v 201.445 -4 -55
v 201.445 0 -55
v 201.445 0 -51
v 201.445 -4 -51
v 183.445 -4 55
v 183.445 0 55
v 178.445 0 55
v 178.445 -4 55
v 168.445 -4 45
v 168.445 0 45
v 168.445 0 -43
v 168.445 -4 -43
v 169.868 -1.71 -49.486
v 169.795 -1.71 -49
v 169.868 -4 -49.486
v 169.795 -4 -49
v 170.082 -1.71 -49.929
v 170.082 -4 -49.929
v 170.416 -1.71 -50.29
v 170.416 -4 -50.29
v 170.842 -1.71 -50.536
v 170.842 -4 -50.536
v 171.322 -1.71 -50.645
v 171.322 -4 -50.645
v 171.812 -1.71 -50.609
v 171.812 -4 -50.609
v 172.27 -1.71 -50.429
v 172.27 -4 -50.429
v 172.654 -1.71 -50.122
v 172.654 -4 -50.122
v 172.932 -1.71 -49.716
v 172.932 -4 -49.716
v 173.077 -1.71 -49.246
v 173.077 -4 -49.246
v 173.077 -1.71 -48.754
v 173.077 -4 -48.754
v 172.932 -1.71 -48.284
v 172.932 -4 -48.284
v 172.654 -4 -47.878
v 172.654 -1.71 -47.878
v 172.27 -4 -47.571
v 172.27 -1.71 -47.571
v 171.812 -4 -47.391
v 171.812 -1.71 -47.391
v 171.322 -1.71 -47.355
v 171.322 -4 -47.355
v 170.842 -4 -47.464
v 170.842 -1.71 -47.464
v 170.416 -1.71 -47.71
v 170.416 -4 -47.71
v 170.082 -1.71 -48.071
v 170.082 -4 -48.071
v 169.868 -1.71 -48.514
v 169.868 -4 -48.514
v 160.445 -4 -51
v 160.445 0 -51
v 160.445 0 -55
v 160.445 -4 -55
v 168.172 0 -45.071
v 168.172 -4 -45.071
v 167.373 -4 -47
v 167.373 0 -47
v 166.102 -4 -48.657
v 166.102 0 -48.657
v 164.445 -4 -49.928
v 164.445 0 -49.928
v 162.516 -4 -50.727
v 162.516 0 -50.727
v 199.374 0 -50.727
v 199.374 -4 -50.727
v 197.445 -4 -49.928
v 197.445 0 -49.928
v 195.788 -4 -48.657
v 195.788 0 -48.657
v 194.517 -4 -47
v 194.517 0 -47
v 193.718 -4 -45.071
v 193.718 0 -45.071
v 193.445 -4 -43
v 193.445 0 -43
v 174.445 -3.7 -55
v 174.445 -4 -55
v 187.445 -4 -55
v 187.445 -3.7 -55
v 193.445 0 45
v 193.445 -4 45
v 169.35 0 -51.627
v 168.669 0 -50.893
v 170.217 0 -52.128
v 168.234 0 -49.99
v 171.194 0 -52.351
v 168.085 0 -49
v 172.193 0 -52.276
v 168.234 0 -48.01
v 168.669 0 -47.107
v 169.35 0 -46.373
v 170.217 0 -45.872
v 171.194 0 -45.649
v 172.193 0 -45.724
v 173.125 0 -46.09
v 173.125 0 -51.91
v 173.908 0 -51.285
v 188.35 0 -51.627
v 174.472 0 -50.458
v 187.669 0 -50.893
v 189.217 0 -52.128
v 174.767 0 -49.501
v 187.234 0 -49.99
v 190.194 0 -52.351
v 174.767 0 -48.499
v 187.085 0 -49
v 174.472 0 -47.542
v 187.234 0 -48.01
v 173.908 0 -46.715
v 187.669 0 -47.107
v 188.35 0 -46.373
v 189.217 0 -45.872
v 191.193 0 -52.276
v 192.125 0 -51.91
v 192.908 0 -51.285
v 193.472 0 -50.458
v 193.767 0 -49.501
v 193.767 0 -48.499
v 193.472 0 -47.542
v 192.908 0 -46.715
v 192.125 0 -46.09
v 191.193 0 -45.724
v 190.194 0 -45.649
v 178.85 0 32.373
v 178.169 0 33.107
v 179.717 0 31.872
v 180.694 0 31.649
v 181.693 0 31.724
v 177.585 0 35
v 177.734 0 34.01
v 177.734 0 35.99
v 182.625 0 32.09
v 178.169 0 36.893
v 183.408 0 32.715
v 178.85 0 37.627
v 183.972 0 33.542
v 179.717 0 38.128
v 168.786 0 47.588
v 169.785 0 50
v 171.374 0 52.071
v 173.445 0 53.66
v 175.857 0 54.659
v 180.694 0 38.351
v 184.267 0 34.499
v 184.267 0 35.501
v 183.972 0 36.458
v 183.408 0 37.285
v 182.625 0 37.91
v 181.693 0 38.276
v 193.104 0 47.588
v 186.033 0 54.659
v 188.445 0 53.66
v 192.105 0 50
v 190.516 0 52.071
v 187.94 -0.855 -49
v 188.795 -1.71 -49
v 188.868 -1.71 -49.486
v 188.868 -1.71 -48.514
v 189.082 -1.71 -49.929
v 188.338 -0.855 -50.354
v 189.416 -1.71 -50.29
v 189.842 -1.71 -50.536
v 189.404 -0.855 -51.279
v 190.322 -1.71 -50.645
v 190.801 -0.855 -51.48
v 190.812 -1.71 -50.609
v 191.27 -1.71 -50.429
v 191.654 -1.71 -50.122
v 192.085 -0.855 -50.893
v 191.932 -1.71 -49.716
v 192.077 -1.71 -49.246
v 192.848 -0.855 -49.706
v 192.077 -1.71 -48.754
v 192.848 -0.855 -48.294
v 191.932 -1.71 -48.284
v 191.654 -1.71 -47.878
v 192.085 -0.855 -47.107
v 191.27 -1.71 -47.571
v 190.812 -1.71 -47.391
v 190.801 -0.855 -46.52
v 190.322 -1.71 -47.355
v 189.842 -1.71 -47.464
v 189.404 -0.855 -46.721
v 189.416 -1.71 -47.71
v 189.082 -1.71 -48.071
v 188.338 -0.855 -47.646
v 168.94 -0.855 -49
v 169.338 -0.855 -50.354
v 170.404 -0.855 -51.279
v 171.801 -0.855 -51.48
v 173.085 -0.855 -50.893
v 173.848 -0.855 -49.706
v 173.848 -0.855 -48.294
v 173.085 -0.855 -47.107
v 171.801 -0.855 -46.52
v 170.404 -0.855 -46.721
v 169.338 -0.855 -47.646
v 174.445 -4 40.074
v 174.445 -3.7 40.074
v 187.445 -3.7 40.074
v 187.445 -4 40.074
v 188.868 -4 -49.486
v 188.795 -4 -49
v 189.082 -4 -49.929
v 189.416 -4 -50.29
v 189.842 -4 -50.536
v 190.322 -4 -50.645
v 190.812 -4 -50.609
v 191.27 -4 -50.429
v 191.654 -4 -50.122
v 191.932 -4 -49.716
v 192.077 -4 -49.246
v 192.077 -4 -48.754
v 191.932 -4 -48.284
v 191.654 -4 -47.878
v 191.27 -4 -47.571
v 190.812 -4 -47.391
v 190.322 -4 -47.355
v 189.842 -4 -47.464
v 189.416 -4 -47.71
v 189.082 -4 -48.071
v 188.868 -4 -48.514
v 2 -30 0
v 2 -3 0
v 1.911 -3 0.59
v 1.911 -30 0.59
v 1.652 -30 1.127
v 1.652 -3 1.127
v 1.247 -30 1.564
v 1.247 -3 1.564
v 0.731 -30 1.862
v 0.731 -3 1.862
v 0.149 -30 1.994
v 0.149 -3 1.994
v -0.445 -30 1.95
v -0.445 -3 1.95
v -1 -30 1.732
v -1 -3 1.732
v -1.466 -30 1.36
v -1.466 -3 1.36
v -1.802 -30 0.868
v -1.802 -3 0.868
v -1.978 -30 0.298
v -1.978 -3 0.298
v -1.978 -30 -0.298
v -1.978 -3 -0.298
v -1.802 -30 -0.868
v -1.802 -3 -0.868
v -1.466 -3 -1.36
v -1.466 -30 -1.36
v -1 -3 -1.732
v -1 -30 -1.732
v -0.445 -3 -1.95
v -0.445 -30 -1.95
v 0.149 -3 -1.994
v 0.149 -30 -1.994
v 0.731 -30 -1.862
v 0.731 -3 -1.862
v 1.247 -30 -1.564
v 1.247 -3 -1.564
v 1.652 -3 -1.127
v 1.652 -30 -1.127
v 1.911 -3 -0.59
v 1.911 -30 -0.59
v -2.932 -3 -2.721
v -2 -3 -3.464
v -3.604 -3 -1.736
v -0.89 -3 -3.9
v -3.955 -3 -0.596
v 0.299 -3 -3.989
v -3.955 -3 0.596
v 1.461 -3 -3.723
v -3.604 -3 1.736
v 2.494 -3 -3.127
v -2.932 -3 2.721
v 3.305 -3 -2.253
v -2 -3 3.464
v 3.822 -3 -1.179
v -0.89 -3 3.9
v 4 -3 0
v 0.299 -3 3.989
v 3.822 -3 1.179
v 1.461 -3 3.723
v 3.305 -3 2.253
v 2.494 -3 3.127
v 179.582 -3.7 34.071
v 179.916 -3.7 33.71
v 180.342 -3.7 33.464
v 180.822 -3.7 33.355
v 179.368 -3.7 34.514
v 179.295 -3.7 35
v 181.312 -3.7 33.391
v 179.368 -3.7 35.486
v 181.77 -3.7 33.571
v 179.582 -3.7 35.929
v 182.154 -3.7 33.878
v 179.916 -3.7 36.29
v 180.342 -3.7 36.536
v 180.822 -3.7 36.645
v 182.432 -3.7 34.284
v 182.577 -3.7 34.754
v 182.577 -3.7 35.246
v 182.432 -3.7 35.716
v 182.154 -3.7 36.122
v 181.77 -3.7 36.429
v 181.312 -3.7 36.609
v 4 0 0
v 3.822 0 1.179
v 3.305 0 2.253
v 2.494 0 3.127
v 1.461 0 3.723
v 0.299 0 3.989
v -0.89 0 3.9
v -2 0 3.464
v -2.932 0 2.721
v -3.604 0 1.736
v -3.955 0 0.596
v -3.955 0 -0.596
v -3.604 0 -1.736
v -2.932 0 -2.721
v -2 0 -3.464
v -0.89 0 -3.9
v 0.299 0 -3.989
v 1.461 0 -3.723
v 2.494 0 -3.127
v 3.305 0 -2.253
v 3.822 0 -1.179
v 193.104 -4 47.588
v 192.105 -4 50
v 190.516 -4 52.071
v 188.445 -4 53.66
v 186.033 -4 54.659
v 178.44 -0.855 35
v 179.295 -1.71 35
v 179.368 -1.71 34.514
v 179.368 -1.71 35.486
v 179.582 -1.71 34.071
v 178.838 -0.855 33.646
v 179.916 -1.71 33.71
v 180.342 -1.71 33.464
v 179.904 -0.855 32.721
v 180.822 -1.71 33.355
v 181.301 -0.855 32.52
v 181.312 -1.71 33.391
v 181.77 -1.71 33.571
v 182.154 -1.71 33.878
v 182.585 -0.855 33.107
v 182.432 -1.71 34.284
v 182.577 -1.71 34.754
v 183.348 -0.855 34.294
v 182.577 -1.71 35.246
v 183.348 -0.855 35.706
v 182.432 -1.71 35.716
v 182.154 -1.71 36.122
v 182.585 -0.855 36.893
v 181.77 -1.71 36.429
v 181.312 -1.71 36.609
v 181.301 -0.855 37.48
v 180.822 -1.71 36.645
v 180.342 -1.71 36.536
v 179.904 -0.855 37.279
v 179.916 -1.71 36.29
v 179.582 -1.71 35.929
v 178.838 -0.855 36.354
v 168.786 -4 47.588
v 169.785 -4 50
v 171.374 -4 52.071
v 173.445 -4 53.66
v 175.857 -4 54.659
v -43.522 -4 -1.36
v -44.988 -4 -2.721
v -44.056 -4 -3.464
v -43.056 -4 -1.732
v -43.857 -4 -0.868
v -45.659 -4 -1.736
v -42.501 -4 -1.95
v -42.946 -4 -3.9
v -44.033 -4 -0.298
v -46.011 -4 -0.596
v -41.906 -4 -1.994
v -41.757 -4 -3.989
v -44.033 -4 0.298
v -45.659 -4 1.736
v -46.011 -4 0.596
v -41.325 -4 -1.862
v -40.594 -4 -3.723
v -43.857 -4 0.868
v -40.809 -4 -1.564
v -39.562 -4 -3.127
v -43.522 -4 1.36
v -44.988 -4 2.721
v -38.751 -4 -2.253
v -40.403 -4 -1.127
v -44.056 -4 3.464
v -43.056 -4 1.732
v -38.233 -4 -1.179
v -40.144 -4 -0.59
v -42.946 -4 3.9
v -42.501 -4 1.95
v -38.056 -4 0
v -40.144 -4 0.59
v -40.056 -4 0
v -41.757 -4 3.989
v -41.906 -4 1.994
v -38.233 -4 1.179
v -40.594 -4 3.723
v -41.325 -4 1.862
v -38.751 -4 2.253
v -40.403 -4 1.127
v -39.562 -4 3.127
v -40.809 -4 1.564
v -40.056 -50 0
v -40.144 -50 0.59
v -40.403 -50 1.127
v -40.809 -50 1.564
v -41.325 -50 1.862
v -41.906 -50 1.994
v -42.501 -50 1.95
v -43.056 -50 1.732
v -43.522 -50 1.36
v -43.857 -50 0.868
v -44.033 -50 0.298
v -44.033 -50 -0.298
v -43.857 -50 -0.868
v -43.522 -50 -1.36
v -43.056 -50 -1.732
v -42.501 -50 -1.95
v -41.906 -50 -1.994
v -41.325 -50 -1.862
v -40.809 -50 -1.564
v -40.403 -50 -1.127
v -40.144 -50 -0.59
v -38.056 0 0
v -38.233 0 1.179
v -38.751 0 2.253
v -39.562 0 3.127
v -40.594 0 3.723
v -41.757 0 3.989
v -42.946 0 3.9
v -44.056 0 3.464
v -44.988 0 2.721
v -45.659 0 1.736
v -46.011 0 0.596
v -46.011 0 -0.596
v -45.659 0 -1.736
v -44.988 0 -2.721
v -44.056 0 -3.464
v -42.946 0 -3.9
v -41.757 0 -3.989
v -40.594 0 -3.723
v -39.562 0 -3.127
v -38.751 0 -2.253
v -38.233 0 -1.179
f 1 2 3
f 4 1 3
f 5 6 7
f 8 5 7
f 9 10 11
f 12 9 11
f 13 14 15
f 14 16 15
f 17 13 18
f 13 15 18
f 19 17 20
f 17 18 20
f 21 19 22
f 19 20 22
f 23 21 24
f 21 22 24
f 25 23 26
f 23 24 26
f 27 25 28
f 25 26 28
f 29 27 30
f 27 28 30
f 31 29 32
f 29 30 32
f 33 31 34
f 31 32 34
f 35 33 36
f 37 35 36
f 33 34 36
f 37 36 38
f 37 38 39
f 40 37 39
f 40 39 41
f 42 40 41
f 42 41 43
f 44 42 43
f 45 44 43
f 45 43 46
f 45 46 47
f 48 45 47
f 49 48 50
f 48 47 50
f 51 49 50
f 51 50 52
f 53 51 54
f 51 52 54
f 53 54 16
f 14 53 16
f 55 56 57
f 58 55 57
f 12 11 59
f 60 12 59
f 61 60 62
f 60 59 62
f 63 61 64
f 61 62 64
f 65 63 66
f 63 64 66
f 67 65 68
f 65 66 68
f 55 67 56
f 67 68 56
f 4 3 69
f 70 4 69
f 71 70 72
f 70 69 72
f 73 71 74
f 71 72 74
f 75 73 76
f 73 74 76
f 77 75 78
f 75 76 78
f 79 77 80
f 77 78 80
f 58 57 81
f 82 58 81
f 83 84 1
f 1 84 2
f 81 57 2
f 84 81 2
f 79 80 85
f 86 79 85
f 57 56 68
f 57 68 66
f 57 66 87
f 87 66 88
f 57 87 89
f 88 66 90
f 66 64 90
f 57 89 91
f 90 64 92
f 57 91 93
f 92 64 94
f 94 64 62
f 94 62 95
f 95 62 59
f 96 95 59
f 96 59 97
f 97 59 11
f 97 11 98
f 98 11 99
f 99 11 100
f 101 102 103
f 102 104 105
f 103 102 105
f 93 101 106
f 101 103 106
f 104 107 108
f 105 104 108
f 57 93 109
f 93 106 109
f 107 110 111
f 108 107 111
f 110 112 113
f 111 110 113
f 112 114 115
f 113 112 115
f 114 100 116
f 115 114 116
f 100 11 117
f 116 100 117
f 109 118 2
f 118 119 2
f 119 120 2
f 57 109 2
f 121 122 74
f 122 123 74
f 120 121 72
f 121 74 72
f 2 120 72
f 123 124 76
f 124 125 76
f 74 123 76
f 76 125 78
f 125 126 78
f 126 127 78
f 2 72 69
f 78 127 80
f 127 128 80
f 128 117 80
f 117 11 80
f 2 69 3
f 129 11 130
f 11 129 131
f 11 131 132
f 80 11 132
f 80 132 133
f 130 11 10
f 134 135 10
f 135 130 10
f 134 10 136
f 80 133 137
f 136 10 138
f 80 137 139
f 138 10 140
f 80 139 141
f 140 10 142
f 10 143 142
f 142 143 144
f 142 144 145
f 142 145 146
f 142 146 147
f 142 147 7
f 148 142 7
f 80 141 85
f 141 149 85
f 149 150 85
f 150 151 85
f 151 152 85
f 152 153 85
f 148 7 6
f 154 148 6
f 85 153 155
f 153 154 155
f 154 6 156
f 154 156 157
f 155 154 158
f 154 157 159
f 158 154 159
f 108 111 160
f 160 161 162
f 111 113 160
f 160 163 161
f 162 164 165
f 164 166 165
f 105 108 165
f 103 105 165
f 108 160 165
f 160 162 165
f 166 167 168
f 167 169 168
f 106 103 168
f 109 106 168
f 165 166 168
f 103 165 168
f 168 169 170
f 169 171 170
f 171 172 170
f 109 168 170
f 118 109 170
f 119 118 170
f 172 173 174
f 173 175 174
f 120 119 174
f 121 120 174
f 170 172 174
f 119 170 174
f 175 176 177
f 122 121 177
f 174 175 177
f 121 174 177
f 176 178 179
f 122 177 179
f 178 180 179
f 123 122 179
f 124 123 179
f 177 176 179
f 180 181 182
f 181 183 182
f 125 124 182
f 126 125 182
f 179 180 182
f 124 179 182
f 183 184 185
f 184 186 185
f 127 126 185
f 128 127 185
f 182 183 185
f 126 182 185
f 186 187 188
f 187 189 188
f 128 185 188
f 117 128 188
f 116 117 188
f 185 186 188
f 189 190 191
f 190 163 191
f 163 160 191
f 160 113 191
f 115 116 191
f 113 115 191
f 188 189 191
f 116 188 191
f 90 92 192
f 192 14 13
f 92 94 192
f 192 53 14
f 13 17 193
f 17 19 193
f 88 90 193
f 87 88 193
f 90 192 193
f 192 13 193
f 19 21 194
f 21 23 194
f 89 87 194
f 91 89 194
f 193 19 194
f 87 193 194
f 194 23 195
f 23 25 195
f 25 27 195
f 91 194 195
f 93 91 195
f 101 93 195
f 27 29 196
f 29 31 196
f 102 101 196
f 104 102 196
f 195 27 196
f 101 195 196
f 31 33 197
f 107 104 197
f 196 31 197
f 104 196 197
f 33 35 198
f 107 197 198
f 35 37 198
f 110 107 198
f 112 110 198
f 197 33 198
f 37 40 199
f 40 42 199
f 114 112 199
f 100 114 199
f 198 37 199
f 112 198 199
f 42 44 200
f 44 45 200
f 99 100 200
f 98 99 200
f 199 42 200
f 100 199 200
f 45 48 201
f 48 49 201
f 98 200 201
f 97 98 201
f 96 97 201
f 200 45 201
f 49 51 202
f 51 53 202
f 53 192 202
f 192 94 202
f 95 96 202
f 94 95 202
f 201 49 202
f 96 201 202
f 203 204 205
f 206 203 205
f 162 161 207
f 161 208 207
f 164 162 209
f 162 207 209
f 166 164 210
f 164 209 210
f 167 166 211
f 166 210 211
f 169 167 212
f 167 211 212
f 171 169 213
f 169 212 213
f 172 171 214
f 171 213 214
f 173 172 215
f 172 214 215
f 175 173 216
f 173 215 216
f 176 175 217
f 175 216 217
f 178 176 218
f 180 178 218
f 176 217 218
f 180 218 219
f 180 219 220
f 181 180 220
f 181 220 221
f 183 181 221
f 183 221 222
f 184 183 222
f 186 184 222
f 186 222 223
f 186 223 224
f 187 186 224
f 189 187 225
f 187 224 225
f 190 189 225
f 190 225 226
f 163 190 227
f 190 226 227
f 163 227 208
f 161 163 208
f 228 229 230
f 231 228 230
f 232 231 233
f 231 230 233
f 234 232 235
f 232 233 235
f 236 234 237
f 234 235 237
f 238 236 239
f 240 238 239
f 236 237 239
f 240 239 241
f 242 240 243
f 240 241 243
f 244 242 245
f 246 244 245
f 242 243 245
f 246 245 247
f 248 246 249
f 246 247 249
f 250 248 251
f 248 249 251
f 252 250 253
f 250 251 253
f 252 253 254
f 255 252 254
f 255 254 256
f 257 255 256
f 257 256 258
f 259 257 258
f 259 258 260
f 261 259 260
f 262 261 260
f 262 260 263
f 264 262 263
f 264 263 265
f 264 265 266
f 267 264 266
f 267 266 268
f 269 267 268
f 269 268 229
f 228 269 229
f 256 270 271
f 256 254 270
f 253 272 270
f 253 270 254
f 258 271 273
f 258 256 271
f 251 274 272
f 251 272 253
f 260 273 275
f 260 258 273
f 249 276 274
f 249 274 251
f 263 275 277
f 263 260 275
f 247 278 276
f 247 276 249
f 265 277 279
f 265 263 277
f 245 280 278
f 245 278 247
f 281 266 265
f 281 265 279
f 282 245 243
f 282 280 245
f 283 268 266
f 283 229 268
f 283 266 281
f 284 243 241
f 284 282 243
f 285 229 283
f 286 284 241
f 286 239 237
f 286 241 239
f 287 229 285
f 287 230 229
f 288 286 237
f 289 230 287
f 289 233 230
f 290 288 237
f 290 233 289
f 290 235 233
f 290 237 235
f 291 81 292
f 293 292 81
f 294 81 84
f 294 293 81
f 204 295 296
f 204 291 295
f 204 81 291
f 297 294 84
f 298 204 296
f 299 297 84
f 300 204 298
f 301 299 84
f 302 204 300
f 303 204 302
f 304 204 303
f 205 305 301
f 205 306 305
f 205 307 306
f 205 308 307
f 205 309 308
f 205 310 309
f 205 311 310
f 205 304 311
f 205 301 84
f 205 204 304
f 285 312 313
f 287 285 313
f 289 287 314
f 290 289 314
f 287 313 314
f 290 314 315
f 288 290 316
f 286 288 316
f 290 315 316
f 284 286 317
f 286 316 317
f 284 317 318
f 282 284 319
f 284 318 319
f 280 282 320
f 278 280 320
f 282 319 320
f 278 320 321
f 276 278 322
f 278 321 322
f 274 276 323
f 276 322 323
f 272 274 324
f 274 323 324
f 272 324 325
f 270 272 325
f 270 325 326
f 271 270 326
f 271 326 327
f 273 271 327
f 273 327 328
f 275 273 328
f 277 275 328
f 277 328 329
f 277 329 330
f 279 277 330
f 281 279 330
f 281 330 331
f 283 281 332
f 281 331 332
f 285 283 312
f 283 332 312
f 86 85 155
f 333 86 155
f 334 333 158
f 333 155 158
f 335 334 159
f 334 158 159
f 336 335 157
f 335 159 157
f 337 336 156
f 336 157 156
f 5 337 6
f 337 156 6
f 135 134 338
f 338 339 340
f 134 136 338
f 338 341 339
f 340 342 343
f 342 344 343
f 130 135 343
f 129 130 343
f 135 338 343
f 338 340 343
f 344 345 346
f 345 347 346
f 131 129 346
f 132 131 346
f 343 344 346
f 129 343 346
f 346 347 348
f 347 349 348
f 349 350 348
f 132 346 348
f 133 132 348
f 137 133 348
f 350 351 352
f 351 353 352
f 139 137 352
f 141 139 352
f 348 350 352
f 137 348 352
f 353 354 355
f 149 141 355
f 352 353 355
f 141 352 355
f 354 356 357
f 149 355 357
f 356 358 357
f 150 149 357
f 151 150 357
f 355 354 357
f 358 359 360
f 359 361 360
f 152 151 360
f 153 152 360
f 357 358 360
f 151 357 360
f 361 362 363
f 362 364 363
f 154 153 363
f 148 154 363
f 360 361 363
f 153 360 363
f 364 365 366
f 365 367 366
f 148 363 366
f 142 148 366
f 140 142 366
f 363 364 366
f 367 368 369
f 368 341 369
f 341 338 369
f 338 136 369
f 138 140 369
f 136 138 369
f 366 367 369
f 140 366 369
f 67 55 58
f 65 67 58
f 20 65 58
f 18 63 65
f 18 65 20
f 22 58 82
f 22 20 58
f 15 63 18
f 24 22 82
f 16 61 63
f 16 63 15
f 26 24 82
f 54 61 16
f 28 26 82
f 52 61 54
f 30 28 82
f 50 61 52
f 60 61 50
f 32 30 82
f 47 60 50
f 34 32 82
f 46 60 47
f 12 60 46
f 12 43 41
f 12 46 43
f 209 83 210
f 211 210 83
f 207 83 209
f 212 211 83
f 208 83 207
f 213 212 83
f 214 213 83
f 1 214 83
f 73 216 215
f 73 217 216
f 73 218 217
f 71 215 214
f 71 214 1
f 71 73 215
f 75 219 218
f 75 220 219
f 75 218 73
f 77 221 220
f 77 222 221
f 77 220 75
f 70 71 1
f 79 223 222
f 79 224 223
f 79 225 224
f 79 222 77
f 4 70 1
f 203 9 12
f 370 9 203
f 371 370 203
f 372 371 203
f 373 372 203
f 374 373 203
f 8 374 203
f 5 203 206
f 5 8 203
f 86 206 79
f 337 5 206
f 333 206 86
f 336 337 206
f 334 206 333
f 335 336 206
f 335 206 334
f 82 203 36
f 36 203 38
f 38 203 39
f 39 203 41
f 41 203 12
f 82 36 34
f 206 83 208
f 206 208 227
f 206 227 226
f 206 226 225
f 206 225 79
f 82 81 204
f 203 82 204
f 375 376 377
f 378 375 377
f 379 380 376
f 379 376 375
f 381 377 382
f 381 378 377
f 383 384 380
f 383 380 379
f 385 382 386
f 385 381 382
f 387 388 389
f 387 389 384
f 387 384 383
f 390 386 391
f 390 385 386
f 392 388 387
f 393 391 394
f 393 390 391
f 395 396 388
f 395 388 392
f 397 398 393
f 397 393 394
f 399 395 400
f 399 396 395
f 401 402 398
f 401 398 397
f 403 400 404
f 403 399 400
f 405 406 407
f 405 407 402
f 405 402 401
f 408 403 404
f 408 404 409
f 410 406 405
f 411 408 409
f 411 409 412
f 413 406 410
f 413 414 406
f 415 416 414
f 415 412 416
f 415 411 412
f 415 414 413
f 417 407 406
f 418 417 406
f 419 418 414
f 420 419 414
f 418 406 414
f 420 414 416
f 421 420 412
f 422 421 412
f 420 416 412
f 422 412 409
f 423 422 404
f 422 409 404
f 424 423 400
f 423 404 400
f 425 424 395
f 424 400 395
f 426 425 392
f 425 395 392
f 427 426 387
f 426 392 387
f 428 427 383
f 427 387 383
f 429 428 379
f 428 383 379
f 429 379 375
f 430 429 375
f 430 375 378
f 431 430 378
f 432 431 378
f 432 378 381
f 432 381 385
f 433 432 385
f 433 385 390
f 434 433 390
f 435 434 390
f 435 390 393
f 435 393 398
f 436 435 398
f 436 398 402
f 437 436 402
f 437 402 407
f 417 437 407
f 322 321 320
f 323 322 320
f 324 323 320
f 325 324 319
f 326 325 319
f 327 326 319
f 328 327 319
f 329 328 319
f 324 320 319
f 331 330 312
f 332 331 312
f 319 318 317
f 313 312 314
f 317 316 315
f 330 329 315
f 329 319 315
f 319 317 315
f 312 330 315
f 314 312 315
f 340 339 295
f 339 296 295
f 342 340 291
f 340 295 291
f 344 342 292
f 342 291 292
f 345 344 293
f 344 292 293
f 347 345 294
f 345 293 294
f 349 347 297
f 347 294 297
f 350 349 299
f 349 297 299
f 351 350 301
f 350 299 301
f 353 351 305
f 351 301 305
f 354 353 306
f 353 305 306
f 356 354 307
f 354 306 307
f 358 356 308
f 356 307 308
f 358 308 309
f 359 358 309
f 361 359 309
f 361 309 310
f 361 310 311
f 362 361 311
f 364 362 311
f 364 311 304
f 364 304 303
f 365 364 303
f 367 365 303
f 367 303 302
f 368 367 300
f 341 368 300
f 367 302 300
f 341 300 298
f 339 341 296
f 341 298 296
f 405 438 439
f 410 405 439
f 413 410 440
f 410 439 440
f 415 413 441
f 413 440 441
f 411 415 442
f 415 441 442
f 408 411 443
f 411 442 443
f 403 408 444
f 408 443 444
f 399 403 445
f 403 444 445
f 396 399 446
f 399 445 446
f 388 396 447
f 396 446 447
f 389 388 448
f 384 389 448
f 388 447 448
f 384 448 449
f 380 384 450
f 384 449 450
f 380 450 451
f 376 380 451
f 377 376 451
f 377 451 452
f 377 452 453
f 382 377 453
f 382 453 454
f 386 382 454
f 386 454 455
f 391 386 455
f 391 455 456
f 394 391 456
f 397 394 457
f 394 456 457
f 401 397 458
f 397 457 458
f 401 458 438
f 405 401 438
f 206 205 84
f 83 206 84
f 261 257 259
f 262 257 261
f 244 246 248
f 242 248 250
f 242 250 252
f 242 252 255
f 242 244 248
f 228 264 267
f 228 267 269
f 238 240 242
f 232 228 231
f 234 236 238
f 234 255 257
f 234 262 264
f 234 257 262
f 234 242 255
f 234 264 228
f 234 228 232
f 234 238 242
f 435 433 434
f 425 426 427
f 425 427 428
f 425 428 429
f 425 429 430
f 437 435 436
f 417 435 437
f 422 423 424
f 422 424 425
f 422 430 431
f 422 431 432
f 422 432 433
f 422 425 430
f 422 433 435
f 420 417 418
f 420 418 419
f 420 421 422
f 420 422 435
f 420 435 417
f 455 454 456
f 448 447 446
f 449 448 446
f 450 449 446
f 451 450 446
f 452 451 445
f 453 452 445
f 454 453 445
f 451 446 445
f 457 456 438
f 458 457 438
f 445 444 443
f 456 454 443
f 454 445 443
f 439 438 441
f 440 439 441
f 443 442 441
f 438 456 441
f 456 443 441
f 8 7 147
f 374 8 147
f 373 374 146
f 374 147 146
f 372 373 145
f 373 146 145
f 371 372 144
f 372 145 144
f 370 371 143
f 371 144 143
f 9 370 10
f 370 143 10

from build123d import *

# Parameters (mm, degrees)
F0_R           = 2
F1_DEPTH       = 80
F0_R_2         = 4
F2_DEPTH       = 3
F3_DEPTH       = 50
F5_DEPTH       = 4
F6_DEPTH       = 3.7
F7_D           = 3.3
F7_CSINK_D     = 6.72
F7_CSINK_ANGLE = 90
F8_D           = 3.3
F8_CSINK_D     = 6.72
F8_CSINK_ANGLE = 90
F9_DEPTH       = 50


with BuildPart() as f1:
    # F0 (on Front) → F1 (new body)
    with BuildSketch(Plane.XZ):
        Circle(F0_R)
    extrude(amount=F1_DEPTH)

    # F0 (on Front) → F2 (join)
    with BuildSketch(Plane.XZ):
        Circle(F0_R_2)
        Circle(F0_R, mode=Mode.SUBTRACT)
    extrude(amount=F2_DEPTH)

    # F3 (cut): a face of the model
    f3_faces = [f1.faces().sort_by_distance(p)[0] for p in [
        (0, -80, 0),
    ]]
    extrude(f3_faces, amount=-F3_DEPTH, mode=Mode.SUBTRACT)


with BuildPart() as f5:
    # F4 (on Front) → F5 (new body)
    with BuildSketch(Plane.XZ):
        with BuildLine():
            Line((160.4449624035, -55), (168.4449624035, -55))
            Line((168.4449624035, -55), (174.4449624035, -55))
            Line((174.4449624035, -55), (174.4449624035, 29.9261510372))
            Line((174.4449624035, 29.9261510372), (174.4449624035, 40.0738489628))
            Line((174.4449624035, 40.0738489628), (187.4449624035, 40.0738489628))
            Line((187.4449624035, 40.0738489628), (187.4449624035, 29.9261510372))
            Line((187.4449624035, 29.9261510372), (187.4449624035, -55))
            Line((187.4449624035, -55), (193.4449624035, -55))
            Line((193.4449624035, -55), (201.4449624035, -55))
            Line((201.4449624035, -55), (201.4449624035, -51))
            ThreePointArc((201.4449624035, -51), (195.788108154, -48.6568542495), (193.4449624035, -43))
            Line((193.4449624035, -43), (193.4449624035, 45))
            ThreePointArc((193.4449624035, 45), (190.5160302153, 52.0710678119), (183.4449624035, 55))
            Line((183.4449624035, 55), (178.4449624035, 55))
            ThreePointArc((178.4449624035, 55), (171.3738945916, 52.0710678119), (168.4449624035, 45))
            Line((168.4449624035, 45), (168.4449624035, -43))
            ThreePointArc((168.4449624035, -43), (166.101816653, -48.6568542495), (160.4449624035, -51))
            Line((160.4449624035, -51), (160.4449624035, -55))
        make_face()
    extrude(amount=F5_DEPTH)

    # F4 (on Front) → F6 (join)
    with BuildSketch(Plane.XZ):
        Polygon((174.4449624035, 29.9261510372), (174.4449624035, -55), (180.9449624035, -55), (187.4449624035, -55), (187.4449624035, 29.9261510372), (187.4449624035, 40.0738489628), (174.4449624035, 40.0738489628), align=None)
    extrude(amount=F6_DEPTH)

    # F7 (through all)
    with Locations(Plane(origin=(0, 0, 0), x_dir=(1, 0, 0), z_dir=(0, 1, 0))):
        with Locations((180.9449624035, -35)):
            CounterSinkHole(F7_D / 2, F7_CSINK_D / 2, counter_sink_angle=F7_CSINK_ANGLE)

    # F8 (through all)
    with Locations(Plane(origin=(0, 0, 0), x_dir=(1, 0, 0), z_dir=(0, 1, 0))):
        with Locations((190.4449624035, 49), (171.4449624035, 49)):
            CounterSinkHole(F8_D / 2, F8_CSINK_D / 2, counter_sink_angle=F8_CSINK_ANGLE)


with BuildPart() as f5b:
    # F0 (on Front) → F5, piece 2 (new body)
    with BuildSketch(Plane.XZ):
        with Locations((-42.0555584133, 0)):
            Circle(F0_R_2)
        with Locations((-42.0555584133, 0)):
            Circle(F0_R, mode=Mode.SUBTRACT)
    extrude(amount=F5_DEPTH)

    # F0 (on Front) → F9 (join)
    with BuildSketch(Plane.XZ):
        with Locations((-42.0555584133, 0)):
            Circle(F0_R)
    extrude(amount=F9_DEPTH)


solid = Compound([f1.part, f5.part, f5b.part])
